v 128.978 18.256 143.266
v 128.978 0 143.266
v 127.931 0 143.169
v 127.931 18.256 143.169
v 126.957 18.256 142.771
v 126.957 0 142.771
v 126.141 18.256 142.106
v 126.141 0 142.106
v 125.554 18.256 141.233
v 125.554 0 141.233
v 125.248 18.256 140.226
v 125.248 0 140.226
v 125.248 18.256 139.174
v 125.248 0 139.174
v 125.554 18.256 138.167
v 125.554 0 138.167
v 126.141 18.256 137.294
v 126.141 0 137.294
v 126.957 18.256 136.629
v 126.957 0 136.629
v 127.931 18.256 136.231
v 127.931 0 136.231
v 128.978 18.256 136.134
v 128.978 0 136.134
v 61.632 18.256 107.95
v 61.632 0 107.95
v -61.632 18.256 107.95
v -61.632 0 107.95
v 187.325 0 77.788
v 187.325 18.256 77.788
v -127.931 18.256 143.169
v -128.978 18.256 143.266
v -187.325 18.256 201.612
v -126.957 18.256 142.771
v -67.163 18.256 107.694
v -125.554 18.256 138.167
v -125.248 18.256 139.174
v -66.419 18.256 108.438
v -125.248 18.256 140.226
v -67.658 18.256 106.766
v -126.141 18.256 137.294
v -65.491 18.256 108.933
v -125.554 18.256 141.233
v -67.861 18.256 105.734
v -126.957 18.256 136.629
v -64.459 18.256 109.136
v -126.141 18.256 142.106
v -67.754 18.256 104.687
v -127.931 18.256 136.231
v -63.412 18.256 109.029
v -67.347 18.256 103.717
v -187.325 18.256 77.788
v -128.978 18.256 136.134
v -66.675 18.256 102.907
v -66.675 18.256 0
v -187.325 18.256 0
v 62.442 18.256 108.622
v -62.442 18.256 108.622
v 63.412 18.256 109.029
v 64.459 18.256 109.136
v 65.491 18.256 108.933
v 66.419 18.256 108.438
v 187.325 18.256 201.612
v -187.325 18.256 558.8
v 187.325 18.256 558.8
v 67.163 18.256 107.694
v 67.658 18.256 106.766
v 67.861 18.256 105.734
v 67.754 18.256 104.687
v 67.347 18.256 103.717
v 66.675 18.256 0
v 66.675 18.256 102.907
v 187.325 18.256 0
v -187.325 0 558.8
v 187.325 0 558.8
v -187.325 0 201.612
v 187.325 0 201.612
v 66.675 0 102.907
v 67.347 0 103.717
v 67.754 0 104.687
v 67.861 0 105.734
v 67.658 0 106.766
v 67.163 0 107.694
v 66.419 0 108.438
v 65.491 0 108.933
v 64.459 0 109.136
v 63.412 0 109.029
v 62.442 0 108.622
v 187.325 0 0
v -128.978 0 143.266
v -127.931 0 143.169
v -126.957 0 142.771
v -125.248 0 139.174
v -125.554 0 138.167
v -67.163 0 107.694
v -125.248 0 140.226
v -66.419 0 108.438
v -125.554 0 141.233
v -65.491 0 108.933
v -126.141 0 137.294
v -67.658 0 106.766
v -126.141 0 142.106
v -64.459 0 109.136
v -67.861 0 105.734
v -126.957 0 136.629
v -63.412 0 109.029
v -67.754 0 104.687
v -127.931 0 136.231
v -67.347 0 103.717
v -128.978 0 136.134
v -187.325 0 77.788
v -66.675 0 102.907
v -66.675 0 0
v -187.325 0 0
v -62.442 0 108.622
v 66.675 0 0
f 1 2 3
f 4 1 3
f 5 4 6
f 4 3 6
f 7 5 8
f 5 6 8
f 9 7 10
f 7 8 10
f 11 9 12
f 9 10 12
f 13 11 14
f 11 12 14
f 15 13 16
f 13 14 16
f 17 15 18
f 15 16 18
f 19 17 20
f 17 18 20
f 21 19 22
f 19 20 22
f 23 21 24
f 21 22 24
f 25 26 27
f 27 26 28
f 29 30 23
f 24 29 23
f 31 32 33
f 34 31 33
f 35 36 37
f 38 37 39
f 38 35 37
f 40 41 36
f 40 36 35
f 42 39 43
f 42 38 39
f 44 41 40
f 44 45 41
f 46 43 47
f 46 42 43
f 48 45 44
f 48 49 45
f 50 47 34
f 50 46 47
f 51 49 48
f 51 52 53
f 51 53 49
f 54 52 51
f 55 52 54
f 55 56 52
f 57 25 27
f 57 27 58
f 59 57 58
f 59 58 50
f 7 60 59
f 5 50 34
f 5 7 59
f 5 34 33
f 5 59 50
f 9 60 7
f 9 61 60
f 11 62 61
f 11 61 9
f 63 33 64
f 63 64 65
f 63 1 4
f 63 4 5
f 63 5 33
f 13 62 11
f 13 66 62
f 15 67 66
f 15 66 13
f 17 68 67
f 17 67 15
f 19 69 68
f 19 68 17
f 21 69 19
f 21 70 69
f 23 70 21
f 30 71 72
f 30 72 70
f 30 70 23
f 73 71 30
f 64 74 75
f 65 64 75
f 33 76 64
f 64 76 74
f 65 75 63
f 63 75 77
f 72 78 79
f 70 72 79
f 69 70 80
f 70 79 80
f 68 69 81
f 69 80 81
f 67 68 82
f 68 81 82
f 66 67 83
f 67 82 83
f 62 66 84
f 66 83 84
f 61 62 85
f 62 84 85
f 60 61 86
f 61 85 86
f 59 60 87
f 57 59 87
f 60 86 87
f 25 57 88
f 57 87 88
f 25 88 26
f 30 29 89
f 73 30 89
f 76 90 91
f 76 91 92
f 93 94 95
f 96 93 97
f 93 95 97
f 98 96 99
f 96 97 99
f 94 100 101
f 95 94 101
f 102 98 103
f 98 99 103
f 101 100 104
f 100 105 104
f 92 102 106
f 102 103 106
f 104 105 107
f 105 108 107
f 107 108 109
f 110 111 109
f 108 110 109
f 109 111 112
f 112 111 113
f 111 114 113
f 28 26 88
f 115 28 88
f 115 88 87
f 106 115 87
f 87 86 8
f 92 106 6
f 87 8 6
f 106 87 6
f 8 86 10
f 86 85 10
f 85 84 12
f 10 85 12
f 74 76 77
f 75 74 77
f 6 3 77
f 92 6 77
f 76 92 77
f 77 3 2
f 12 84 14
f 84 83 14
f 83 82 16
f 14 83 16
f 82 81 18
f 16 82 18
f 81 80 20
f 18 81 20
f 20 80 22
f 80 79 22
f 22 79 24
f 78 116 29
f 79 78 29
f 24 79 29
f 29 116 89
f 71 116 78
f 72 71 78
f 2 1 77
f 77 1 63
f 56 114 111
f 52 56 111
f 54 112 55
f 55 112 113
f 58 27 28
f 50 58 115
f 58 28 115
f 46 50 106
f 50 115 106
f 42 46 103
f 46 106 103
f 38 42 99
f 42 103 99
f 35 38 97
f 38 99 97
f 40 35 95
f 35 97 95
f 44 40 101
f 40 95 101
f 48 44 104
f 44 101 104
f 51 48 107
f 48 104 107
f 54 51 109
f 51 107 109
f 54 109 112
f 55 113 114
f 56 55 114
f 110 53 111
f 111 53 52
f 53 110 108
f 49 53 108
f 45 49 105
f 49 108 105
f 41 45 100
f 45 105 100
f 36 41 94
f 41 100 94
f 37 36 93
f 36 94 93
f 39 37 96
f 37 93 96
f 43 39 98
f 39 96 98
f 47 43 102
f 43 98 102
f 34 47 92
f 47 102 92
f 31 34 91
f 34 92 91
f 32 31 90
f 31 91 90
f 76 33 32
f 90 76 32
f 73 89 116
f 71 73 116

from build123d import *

# Parameters (mm, degrees)
BOSS_EXTRUDE1_DEPTH         = 18.25625
CUT_EXTRUDE1_DEPTH          = 590.645135899
F_1_4_CLEARANCE_HOLE1_D     = 7.14248
F_1_4_CLEARANCE_HOLE1_DEPTH = 18.25625


with BuildPart() as part:
    # Sketch1 → Boss-Extrude1 (new body)
    with BuildSketch(Plane(origin=(0, 0, 0), x_dir=(1, 0, 0), z_dir=(0, 1, 0))):
        Polygon((-187.325, -558.8), (187.325, -558.8), (187.325, 0), (66.675, 0), (66.675, -107.95), (-66.675, -107.95), (-66.675, 0), (-187.325, 0), align=None)
    extrude(amount=BOSS_EXTRUDE1_DEPTH)

    # Sketch2 → Cut-Extrude1 (cut, through all)
    with BuildSketch(Plane(origin=(0, 18.25625, 0), x_dir=(1, 0, 0), z_dir=(0, 1, 0))):
        Polygon((-187.325, -201.6125), (-125.4125, -139.7), (-187.325, -77.7875), align=None)
        Polygon((125.4125, -139.7), (187.325, -201.6125), (187.325, -77.7875), align=None)
    extrude(amount=-CUT_EXTRUDE1_DEPTH, mode=Mode.SUBTRACT)

    # 1/4 Clearance Hole1
    with Locations(Plane(origin=(0, 18.25625, 0), x_dir=(1, 0, 0), z_dir=(0, 1, 0))):
        with Locations((-64.29375, -105.56875), (64.29375, -105.56875), (-128.780096045, -139.7), (128.780096045, -139.7)):
            Hole(F_1_4_CLEARANCE_HOLE1_D / 2, depth=F_1_4_CLEARANCE_HOLE1_DEPTH)


solid = part.part
